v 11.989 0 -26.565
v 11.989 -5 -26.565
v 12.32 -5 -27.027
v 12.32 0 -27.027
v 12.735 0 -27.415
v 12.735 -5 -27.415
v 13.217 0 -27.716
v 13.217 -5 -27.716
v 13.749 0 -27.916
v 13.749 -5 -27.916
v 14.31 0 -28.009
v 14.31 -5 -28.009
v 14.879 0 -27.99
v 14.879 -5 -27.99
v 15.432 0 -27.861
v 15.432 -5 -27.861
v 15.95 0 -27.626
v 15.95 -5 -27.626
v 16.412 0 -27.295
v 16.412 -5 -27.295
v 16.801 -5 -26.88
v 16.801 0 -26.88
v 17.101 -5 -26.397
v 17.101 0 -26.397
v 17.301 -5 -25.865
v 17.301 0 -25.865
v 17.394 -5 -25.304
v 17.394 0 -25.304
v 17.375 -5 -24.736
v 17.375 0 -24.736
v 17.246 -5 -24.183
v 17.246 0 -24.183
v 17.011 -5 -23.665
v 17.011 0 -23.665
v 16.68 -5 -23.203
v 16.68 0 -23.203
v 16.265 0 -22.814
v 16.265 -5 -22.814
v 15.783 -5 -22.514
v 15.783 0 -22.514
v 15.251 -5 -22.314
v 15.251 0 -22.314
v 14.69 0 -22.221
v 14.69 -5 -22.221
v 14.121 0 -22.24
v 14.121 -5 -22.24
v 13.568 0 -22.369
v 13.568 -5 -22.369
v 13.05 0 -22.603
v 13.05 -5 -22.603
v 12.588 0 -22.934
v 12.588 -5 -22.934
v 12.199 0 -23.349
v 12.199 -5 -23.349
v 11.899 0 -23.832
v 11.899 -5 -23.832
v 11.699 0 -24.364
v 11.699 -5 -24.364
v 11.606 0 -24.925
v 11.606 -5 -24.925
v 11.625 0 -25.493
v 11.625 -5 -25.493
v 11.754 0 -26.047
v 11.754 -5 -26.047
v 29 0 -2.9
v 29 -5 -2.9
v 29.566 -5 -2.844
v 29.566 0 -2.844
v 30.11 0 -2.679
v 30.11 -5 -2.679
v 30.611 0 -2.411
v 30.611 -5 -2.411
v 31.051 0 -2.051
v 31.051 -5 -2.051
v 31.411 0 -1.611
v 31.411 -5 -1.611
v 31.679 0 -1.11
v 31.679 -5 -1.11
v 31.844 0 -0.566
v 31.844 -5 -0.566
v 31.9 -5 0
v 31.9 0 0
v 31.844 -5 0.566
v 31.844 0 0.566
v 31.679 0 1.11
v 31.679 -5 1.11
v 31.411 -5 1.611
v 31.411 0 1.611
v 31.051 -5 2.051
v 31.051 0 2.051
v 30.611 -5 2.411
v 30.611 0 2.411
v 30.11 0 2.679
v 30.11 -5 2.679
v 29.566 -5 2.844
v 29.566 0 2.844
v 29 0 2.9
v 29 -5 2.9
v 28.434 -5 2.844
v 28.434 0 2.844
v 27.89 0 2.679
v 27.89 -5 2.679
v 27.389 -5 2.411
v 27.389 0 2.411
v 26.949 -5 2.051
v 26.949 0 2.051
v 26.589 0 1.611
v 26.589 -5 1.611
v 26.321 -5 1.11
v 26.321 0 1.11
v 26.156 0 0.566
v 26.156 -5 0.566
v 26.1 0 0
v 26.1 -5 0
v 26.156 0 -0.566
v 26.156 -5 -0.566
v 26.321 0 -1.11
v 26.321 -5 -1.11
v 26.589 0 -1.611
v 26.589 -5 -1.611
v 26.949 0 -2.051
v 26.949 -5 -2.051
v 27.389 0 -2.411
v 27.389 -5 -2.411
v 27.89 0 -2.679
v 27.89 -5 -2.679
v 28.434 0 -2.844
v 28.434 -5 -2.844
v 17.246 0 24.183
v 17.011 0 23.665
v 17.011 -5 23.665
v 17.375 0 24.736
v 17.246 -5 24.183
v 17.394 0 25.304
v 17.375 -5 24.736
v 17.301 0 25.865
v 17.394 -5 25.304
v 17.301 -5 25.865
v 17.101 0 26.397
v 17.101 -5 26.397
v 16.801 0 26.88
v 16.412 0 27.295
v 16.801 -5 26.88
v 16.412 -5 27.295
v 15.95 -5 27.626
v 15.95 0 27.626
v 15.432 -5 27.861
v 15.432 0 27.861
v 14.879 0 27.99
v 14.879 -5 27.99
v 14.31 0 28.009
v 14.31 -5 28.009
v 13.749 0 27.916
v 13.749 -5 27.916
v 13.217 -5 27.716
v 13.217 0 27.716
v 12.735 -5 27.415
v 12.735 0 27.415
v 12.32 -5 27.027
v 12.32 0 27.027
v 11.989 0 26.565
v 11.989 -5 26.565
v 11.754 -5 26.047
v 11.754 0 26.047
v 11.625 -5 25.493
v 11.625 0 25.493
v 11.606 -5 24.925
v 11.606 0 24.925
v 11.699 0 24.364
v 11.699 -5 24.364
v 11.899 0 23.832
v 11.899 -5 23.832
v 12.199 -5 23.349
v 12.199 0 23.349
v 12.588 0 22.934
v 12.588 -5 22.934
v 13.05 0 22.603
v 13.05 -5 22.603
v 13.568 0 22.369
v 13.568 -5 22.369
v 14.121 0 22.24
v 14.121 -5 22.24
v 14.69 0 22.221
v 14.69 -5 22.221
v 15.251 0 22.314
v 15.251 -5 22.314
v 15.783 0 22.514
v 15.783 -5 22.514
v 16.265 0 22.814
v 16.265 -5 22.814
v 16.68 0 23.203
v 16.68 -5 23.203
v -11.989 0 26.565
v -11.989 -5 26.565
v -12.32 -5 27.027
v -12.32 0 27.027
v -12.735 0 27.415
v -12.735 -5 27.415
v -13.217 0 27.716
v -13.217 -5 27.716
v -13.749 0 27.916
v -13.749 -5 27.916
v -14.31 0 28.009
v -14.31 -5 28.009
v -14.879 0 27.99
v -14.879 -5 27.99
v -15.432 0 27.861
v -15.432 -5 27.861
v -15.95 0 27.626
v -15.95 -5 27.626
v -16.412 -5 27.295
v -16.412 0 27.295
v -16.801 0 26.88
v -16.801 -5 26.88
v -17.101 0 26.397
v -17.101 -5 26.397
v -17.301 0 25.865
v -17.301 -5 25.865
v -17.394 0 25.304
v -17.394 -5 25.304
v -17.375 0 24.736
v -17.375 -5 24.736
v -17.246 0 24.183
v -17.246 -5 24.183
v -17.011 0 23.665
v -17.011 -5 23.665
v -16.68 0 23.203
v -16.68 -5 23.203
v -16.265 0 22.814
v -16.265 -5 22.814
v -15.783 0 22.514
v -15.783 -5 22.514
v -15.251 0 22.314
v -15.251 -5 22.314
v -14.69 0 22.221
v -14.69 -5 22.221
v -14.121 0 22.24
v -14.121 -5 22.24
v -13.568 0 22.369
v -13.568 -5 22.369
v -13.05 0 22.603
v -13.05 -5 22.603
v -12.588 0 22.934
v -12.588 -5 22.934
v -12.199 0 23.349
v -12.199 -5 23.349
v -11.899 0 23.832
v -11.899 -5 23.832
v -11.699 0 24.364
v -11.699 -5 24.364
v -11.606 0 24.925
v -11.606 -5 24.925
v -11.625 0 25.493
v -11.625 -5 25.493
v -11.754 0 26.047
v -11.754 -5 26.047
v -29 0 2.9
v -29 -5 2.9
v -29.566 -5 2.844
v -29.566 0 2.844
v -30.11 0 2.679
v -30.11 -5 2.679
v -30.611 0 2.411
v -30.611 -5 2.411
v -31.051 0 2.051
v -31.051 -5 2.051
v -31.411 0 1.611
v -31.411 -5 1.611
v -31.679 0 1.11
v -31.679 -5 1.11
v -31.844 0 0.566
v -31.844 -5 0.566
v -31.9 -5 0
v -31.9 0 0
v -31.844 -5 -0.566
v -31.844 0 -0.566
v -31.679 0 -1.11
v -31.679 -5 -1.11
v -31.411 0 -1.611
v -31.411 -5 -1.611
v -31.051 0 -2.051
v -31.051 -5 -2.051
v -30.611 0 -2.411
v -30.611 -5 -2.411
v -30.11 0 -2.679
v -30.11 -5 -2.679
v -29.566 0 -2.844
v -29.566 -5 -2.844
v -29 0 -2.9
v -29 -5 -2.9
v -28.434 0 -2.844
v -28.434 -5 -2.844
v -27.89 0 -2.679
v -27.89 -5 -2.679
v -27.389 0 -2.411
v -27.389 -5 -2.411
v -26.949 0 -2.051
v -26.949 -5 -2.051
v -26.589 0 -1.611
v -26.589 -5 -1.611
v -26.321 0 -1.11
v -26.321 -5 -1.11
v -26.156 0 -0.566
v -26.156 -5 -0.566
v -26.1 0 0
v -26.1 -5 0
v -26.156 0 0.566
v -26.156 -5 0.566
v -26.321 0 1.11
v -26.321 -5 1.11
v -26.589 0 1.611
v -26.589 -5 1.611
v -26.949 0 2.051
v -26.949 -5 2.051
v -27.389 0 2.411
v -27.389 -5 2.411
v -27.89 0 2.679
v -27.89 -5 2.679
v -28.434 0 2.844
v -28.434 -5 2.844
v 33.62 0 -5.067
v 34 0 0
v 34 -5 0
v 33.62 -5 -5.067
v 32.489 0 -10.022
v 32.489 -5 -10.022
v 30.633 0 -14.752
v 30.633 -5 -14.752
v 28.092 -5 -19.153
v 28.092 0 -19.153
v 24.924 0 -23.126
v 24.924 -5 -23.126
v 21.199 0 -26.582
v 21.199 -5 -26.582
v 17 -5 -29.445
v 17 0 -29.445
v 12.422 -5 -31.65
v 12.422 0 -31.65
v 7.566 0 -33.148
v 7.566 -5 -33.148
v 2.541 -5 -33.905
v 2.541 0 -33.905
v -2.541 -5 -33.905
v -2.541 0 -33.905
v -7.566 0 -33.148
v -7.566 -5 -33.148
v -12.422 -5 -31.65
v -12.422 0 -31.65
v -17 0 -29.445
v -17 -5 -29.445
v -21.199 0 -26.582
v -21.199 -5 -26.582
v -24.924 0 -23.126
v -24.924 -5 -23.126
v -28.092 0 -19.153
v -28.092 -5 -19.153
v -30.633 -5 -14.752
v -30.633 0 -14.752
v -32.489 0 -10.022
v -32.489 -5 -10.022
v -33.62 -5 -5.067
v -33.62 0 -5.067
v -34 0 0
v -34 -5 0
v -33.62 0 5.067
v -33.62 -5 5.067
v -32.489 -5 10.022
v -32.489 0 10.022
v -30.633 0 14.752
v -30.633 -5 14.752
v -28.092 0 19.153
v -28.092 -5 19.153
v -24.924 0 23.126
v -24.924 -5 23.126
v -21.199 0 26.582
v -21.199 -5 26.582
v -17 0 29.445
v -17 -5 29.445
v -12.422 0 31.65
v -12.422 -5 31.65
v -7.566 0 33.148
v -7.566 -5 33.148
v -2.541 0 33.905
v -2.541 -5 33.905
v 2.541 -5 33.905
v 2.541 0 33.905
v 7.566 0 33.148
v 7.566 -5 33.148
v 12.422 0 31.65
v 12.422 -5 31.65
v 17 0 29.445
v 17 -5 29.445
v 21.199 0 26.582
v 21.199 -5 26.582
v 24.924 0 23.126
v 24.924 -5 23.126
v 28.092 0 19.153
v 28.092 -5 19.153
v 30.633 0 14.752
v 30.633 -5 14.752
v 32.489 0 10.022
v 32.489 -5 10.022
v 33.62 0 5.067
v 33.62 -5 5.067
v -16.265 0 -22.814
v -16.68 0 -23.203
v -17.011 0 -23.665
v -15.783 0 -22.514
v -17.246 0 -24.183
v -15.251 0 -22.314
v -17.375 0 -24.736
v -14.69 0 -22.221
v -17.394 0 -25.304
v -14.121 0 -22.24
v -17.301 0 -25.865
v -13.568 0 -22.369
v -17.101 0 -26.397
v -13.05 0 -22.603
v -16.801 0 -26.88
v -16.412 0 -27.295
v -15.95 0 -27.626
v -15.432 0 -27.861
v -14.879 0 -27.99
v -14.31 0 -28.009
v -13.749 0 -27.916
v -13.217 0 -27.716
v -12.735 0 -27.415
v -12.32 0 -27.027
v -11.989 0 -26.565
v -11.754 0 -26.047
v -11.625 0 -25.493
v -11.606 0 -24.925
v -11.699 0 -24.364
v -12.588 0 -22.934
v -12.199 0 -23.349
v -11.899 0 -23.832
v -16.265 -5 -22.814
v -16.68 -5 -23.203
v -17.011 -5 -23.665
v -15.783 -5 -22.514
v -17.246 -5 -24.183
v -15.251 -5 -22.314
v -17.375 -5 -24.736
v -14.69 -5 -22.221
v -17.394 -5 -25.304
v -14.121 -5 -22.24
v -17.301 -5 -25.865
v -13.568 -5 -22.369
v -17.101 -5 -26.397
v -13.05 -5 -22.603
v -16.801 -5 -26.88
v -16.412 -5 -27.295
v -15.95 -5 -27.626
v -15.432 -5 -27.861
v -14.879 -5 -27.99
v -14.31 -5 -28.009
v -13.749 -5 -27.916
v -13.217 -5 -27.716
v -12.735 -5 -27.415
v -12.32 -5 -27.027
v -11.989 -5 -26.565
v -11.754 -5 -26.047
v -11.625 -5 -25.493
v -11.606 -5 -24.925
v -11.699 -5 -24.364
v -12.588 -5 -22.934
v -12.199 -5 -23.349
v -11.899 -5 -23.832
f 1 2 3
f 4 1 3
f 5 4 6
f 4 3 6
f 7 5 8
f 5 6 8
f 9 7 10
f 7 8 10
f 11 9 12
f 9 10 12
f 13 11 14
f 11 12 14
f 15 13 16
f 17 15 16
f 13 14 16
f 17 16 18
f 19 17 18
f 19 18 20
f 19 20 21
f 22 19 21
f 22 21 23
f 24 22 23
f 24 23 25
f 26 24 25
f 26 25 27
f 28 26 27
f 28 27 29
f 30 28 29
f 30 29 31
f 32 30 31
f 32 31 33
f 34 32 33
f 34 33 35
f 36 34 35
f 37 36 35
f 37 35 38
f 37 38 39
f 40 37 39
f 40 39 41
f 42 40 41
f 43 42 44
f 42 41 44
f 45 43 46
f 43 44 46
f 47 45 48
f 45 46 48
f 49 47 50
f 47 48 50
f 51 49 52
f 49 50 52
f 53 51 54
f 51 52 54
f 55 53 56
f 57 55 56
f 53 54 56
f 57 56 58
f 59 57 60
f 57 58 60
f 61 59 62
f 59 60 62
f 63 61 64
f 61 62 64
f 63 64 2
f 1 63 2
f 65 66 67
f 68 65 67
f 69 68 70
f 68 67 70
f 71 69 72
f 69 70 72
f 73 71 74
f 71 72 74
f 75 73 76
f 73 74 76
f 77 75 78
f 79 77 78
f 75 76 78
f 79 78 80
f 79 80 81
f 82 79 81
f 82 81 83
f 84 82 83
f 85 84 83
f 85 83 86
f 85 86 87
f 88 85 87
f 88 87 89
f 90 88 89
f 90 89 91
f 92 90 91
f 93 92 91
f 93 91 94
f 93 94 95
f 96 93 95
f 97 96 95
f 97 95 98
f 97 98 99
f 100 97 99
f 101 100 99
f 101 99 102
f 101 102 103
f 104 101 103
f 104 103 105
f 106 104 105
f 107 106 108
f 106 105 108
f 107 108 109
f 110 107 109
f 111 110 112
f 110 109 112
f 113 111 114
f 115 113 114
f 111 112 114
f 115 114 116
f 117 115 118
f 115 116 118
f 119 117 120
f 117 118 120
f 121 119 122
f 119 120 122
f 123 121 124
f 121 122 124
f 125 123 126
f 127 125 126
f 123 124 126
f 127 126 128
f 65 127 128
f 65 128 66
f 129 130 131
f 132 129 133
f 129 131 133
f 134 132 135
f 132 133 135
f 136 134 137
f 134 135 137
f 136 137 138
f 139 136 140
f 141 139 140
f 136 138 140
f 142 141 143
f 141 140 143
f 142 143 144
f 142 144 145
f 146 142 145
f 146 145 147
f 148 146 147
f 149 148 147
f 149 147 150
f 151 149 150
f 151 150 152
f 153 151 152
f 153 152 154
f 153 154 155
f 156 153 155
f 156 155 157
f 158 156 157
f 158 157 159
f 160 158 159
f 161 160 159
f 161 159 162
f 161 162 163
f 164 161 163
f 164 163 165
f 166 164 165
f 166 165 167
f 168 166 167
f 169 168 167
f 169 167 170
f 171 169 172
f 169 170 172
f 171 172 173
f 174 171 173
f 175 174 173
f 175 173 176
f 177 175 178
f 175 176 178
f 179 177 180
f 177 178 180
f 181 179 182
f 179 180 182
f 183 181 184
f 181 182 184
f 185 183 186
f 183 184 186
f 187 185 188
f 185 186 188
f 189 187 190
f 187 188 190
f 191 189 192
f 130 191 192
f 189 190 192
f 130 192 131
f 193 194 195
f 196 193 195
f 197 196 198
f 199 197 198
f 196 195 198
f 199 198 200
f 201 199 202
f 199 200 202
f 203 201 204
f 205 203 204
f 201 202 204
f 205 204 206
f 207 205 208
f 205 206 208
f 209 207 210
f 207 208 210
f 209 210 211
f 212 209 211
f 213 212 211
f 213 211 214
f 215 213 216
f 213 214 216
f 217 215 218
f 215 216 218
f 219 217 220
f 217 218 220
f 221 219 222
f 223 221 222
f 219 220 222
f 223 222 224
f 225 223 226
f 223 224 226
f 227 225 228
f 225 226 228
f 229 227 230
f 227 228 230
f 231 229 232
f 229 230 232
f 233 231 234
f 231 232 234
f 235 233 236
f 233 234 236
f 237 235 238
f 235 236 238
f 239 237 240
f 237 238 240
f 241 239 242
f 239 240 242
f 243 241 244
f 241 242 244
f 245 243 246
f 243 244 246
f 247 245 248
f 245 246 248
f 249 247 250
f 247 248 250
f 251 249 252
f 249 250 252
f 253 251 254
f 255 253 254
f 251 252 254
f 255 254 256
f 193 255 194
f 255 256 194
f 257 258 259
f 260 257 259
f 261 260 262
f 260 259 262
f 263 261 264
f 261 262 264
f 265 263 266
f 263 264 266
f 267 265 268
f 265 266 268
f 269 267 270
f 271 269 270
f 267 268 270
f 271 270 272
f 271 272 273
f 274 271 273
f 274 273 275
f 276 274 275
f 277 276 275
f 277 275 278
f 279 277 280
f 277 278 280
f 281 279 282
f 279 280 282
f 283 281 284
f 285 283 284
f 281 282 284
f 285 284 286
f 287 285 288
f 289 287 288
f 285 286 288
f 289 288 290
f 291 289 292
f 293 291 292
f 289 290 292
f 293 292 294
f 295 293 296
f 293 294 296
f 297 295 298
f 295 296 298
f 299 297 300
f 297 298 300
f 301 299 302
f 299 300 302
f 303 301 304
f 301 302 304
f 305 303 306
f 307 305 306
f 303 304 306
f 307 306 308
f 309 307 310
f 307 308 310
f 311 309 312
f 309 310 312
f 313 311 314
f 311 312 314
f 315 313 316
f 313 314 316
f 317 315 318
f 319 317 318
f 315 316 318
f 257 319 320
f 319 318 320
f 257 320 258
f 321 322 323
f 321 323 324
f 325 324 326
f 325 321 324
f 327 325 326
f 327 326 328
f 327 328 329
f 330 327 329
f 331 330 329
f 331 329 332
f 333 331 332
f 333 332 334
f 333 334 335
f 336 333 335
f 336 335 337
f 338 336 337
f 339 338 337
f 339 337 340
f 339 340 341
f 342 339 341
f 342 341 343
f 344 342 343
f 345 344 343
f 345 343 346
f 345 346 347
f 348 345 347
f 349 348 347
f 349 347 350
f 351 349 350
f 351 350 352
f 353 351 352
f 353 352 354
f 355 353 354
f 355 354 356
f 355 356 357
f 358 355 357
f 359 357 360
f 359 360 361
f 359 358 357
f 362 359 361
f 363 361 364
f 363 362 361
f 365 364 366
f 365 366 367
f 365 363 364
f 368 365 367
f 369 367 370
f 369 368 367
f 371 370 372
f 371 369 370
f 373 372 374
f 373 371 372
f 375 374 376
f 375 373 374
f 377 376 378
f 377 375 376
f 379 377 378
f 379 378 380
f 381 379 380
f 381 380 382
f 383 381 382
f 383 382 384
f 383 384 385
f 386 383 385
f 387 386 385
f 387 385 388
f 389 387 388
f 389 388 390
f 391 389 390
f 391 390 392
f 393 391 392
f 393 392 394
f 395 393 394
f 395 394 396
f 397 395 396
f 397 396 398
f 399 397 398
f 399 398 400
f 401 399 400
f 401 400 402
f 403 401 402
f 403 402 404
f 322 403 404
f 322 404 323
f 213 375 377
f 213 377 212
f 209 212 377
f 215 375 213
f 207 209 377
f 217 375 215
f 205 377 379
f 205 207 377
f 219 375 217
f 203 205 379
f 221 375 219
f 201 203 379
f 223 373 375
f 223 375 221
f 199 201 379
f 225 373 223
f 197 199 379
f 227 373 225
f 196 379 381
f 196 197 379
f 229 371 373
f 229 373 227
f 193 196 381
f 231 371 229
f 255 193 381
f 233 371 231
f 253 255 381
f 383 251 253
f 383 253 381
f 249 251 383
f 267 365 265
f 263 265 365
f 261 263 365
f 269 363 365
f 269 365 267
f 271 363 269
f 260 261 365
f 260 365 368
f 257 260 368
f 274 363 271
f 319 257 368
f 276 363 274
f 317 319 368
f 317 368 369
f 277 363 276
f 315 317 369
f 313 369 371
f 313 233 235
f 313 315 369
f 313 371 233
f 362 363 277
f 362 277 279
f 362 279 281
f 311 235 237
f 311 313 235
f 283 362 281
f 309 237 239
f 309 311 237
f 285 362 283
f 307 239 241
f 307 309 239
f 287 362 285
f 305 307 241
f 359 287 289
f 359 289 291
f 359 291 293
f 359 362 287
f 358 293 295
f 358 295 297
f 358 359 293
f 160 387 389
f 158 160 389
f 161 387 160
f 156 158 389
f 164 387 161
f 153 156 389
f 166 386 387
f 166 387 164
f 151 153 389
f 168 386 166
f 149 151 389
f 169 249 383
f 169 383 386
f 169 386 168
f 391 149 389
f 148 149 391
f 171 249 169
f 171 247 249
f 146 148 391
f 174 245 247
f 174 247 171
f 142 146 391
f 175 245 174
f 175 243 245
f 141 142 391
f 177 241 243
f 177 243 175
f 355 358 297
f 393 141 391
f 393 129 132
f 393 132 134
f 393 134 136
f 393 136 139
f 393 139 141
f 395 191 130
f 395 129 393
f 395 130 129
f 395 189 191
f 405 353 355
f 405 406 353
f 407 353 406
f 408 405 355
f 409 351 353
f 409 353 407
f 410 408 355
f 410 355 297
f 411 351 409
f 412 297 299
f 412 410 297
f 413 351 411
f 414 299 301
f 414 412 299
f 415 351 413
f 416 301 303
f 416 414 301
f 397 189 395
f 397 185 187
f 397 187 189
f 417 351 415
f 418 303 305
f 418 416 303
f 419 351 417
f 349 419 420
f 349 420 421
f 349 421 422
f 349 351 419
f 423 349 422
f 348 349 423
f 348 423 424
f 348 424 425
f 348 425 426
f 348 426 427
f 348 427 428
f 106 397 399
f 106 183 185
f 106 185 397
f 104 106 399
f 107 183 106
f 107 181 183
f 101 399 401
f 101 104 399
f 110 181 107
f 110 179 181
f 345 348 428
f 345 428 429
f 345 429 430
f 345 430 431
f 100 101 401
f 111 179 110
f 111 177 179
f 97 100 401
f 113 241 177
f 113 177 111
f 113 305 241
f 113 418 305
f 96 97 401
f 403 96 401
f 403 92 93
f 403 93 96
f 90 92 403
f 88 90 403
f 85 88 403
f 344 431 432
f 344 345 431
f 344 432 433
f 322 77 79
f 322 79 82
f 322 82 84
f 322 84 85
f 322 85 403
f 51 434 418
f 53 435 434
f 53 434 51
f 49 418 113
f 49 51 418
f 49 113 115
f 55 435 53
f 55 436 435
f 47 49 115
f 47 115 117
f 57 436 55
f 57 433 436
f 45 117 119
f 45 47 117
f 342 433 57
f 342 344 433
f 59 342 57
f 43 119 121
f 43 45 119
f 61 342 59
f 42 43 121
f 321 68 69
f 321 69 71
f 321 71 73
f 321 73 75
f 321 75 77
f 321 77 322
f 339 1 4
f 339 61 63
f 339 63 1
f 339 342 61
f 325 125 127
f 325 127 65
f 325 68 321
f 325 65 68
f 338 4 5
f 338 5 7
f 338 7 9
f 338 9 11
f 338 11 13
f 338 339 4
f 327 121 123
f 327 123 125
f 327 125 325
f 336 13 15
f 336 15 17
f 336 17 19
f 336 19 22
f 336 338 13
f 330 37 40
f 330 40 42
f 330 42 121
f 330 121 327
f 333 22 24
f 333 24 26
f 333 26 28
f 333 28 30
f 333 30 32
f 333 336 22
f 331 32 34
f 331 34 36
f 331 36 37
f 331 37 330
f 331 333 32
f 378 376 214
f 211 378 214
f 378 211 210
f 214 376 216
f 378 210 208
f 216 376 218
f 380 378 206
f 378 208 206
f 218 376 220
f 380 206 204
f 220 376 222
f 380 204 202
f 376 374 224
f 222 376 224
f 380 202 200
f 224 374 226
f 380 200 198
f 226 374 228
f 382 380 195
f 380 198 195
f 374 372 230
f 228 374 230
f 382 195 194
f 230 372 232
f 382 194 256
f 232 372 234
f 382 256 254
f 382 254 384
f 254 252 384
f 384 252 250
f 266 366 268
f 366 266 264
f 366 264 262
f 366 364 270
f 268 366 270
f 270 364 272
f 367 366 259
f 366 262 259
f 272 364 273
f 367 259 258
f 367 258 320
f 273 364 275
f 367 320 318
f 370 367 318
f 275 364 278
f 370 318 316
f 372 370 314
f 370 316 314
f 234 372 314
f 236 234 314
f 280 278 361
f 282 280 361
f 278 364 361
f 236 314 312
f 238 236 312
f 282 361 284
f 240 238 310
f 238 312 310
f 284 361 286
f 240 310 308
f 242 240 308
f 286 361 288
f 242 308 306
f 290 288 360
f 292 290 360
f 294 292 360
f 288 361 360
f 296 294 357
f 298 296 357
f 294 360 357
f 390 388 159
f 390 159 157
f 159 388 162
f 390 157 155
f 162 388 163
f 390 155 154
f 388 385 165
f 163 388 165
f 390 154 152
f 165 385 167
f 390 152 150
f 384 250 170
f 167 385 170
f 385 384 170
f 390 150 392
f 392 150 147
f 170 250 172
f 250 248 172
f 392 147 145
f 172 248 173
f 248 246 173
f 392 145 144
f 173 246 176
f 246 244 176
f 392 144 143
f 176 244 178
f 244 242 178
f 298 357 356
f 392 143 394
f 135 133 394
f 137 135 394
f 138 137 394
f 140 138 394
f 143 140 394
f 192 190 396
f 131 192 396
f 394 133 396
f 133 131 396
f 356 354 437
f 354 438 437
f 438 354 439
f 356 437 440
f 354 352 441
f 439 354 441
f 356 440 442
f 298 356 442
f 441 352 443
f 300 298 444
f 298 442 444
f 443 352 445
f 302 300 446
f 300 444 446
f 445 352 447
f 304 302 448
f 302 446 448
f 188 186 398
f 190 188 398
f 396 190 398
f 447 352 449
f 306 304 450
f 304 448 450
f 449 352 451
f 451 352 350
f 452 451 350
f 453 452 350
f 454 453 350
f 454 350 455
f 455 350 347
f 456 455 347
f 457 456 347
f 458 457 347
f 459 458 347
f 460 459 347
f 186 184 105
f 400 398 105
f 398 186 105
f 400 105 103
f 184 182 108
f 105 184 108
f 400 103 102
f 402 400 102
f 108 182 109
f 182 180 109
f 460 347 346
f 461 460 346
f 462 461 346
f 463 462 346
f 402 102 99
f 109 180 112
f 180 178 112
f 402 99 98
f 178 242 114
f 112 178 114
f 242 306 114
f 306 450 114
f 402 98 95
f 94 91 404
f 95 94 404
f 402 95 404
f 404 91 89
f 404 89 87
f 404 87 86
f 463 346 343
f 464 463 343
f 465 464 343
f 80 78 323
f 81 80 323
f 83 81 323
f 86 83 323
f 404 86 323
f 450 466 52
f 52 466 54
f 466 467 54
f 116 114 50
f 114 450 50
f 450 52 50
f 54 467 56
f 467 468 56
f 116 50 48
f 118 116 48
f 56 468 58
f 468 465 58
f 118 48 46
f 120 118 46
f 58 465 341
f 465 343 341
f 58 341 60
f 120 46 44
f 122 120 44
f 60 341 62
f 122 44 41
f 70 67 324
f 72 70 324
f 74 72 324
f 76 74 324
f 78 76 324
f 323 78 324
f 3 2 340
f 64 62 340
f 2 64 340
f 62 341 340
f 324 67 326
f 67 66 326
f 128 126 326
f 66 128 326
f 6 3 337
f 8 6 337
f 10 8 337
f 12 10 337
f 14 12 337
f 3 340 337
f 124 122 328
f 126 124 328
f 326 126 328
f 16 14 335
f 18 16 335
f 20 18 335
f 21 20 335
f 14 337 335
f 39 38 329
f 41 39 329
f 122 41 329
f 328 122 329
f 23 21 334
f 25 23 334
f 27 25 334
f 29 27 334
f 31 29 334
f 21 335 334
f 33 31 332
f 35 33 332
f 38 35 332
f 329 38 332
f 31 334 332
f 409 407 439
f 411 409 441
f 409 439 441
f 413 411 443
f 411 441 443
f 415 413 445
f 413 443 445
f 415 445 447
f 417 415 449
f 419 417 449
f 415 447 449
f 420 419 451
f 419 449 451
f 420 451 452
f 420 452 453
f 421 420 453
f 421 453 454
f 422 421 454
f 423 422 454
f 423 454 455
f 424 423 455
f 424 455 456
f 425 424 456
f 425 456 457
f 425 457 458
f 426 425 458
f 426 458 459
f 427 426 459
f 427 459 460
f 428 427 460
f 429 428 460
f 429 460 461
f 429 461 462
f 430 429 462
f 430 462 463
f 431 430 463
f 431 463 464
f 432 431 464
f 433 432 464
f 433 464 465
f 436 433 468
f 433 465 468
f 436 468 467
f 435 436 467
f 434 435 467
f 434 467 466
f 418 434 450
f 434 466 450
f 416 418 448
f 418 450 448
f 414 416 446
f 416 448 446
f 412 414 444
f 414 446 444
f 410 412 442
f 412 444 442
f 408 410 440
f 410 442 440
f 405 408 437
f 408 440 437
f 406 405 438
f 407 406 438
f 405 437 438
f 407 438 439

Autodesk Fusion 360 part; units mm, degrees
sketch "Sketch1" plane through (0, 0, 0) normal (0, 1, 0) x (1, 0, 0)
  circle A0 centre (0, 0) radius 34
  circle A1 centre (0, 0) radius 29 construction
  point P0 (-29, 0)
  dimension "d1" = 68
  dimension "d2" = 58
extrude "Extrude1" add sketch "Sketch1" against normal blind 5
hole "Hole1" at (-29, 0, 0) direction (0, -1, 0) diameter 5.8 end through all
pattern_circular "C-Pattern1" count 6 over 360 about axis through (0, 1.75, 0) along (0, 1, 0) of "Hole1"
